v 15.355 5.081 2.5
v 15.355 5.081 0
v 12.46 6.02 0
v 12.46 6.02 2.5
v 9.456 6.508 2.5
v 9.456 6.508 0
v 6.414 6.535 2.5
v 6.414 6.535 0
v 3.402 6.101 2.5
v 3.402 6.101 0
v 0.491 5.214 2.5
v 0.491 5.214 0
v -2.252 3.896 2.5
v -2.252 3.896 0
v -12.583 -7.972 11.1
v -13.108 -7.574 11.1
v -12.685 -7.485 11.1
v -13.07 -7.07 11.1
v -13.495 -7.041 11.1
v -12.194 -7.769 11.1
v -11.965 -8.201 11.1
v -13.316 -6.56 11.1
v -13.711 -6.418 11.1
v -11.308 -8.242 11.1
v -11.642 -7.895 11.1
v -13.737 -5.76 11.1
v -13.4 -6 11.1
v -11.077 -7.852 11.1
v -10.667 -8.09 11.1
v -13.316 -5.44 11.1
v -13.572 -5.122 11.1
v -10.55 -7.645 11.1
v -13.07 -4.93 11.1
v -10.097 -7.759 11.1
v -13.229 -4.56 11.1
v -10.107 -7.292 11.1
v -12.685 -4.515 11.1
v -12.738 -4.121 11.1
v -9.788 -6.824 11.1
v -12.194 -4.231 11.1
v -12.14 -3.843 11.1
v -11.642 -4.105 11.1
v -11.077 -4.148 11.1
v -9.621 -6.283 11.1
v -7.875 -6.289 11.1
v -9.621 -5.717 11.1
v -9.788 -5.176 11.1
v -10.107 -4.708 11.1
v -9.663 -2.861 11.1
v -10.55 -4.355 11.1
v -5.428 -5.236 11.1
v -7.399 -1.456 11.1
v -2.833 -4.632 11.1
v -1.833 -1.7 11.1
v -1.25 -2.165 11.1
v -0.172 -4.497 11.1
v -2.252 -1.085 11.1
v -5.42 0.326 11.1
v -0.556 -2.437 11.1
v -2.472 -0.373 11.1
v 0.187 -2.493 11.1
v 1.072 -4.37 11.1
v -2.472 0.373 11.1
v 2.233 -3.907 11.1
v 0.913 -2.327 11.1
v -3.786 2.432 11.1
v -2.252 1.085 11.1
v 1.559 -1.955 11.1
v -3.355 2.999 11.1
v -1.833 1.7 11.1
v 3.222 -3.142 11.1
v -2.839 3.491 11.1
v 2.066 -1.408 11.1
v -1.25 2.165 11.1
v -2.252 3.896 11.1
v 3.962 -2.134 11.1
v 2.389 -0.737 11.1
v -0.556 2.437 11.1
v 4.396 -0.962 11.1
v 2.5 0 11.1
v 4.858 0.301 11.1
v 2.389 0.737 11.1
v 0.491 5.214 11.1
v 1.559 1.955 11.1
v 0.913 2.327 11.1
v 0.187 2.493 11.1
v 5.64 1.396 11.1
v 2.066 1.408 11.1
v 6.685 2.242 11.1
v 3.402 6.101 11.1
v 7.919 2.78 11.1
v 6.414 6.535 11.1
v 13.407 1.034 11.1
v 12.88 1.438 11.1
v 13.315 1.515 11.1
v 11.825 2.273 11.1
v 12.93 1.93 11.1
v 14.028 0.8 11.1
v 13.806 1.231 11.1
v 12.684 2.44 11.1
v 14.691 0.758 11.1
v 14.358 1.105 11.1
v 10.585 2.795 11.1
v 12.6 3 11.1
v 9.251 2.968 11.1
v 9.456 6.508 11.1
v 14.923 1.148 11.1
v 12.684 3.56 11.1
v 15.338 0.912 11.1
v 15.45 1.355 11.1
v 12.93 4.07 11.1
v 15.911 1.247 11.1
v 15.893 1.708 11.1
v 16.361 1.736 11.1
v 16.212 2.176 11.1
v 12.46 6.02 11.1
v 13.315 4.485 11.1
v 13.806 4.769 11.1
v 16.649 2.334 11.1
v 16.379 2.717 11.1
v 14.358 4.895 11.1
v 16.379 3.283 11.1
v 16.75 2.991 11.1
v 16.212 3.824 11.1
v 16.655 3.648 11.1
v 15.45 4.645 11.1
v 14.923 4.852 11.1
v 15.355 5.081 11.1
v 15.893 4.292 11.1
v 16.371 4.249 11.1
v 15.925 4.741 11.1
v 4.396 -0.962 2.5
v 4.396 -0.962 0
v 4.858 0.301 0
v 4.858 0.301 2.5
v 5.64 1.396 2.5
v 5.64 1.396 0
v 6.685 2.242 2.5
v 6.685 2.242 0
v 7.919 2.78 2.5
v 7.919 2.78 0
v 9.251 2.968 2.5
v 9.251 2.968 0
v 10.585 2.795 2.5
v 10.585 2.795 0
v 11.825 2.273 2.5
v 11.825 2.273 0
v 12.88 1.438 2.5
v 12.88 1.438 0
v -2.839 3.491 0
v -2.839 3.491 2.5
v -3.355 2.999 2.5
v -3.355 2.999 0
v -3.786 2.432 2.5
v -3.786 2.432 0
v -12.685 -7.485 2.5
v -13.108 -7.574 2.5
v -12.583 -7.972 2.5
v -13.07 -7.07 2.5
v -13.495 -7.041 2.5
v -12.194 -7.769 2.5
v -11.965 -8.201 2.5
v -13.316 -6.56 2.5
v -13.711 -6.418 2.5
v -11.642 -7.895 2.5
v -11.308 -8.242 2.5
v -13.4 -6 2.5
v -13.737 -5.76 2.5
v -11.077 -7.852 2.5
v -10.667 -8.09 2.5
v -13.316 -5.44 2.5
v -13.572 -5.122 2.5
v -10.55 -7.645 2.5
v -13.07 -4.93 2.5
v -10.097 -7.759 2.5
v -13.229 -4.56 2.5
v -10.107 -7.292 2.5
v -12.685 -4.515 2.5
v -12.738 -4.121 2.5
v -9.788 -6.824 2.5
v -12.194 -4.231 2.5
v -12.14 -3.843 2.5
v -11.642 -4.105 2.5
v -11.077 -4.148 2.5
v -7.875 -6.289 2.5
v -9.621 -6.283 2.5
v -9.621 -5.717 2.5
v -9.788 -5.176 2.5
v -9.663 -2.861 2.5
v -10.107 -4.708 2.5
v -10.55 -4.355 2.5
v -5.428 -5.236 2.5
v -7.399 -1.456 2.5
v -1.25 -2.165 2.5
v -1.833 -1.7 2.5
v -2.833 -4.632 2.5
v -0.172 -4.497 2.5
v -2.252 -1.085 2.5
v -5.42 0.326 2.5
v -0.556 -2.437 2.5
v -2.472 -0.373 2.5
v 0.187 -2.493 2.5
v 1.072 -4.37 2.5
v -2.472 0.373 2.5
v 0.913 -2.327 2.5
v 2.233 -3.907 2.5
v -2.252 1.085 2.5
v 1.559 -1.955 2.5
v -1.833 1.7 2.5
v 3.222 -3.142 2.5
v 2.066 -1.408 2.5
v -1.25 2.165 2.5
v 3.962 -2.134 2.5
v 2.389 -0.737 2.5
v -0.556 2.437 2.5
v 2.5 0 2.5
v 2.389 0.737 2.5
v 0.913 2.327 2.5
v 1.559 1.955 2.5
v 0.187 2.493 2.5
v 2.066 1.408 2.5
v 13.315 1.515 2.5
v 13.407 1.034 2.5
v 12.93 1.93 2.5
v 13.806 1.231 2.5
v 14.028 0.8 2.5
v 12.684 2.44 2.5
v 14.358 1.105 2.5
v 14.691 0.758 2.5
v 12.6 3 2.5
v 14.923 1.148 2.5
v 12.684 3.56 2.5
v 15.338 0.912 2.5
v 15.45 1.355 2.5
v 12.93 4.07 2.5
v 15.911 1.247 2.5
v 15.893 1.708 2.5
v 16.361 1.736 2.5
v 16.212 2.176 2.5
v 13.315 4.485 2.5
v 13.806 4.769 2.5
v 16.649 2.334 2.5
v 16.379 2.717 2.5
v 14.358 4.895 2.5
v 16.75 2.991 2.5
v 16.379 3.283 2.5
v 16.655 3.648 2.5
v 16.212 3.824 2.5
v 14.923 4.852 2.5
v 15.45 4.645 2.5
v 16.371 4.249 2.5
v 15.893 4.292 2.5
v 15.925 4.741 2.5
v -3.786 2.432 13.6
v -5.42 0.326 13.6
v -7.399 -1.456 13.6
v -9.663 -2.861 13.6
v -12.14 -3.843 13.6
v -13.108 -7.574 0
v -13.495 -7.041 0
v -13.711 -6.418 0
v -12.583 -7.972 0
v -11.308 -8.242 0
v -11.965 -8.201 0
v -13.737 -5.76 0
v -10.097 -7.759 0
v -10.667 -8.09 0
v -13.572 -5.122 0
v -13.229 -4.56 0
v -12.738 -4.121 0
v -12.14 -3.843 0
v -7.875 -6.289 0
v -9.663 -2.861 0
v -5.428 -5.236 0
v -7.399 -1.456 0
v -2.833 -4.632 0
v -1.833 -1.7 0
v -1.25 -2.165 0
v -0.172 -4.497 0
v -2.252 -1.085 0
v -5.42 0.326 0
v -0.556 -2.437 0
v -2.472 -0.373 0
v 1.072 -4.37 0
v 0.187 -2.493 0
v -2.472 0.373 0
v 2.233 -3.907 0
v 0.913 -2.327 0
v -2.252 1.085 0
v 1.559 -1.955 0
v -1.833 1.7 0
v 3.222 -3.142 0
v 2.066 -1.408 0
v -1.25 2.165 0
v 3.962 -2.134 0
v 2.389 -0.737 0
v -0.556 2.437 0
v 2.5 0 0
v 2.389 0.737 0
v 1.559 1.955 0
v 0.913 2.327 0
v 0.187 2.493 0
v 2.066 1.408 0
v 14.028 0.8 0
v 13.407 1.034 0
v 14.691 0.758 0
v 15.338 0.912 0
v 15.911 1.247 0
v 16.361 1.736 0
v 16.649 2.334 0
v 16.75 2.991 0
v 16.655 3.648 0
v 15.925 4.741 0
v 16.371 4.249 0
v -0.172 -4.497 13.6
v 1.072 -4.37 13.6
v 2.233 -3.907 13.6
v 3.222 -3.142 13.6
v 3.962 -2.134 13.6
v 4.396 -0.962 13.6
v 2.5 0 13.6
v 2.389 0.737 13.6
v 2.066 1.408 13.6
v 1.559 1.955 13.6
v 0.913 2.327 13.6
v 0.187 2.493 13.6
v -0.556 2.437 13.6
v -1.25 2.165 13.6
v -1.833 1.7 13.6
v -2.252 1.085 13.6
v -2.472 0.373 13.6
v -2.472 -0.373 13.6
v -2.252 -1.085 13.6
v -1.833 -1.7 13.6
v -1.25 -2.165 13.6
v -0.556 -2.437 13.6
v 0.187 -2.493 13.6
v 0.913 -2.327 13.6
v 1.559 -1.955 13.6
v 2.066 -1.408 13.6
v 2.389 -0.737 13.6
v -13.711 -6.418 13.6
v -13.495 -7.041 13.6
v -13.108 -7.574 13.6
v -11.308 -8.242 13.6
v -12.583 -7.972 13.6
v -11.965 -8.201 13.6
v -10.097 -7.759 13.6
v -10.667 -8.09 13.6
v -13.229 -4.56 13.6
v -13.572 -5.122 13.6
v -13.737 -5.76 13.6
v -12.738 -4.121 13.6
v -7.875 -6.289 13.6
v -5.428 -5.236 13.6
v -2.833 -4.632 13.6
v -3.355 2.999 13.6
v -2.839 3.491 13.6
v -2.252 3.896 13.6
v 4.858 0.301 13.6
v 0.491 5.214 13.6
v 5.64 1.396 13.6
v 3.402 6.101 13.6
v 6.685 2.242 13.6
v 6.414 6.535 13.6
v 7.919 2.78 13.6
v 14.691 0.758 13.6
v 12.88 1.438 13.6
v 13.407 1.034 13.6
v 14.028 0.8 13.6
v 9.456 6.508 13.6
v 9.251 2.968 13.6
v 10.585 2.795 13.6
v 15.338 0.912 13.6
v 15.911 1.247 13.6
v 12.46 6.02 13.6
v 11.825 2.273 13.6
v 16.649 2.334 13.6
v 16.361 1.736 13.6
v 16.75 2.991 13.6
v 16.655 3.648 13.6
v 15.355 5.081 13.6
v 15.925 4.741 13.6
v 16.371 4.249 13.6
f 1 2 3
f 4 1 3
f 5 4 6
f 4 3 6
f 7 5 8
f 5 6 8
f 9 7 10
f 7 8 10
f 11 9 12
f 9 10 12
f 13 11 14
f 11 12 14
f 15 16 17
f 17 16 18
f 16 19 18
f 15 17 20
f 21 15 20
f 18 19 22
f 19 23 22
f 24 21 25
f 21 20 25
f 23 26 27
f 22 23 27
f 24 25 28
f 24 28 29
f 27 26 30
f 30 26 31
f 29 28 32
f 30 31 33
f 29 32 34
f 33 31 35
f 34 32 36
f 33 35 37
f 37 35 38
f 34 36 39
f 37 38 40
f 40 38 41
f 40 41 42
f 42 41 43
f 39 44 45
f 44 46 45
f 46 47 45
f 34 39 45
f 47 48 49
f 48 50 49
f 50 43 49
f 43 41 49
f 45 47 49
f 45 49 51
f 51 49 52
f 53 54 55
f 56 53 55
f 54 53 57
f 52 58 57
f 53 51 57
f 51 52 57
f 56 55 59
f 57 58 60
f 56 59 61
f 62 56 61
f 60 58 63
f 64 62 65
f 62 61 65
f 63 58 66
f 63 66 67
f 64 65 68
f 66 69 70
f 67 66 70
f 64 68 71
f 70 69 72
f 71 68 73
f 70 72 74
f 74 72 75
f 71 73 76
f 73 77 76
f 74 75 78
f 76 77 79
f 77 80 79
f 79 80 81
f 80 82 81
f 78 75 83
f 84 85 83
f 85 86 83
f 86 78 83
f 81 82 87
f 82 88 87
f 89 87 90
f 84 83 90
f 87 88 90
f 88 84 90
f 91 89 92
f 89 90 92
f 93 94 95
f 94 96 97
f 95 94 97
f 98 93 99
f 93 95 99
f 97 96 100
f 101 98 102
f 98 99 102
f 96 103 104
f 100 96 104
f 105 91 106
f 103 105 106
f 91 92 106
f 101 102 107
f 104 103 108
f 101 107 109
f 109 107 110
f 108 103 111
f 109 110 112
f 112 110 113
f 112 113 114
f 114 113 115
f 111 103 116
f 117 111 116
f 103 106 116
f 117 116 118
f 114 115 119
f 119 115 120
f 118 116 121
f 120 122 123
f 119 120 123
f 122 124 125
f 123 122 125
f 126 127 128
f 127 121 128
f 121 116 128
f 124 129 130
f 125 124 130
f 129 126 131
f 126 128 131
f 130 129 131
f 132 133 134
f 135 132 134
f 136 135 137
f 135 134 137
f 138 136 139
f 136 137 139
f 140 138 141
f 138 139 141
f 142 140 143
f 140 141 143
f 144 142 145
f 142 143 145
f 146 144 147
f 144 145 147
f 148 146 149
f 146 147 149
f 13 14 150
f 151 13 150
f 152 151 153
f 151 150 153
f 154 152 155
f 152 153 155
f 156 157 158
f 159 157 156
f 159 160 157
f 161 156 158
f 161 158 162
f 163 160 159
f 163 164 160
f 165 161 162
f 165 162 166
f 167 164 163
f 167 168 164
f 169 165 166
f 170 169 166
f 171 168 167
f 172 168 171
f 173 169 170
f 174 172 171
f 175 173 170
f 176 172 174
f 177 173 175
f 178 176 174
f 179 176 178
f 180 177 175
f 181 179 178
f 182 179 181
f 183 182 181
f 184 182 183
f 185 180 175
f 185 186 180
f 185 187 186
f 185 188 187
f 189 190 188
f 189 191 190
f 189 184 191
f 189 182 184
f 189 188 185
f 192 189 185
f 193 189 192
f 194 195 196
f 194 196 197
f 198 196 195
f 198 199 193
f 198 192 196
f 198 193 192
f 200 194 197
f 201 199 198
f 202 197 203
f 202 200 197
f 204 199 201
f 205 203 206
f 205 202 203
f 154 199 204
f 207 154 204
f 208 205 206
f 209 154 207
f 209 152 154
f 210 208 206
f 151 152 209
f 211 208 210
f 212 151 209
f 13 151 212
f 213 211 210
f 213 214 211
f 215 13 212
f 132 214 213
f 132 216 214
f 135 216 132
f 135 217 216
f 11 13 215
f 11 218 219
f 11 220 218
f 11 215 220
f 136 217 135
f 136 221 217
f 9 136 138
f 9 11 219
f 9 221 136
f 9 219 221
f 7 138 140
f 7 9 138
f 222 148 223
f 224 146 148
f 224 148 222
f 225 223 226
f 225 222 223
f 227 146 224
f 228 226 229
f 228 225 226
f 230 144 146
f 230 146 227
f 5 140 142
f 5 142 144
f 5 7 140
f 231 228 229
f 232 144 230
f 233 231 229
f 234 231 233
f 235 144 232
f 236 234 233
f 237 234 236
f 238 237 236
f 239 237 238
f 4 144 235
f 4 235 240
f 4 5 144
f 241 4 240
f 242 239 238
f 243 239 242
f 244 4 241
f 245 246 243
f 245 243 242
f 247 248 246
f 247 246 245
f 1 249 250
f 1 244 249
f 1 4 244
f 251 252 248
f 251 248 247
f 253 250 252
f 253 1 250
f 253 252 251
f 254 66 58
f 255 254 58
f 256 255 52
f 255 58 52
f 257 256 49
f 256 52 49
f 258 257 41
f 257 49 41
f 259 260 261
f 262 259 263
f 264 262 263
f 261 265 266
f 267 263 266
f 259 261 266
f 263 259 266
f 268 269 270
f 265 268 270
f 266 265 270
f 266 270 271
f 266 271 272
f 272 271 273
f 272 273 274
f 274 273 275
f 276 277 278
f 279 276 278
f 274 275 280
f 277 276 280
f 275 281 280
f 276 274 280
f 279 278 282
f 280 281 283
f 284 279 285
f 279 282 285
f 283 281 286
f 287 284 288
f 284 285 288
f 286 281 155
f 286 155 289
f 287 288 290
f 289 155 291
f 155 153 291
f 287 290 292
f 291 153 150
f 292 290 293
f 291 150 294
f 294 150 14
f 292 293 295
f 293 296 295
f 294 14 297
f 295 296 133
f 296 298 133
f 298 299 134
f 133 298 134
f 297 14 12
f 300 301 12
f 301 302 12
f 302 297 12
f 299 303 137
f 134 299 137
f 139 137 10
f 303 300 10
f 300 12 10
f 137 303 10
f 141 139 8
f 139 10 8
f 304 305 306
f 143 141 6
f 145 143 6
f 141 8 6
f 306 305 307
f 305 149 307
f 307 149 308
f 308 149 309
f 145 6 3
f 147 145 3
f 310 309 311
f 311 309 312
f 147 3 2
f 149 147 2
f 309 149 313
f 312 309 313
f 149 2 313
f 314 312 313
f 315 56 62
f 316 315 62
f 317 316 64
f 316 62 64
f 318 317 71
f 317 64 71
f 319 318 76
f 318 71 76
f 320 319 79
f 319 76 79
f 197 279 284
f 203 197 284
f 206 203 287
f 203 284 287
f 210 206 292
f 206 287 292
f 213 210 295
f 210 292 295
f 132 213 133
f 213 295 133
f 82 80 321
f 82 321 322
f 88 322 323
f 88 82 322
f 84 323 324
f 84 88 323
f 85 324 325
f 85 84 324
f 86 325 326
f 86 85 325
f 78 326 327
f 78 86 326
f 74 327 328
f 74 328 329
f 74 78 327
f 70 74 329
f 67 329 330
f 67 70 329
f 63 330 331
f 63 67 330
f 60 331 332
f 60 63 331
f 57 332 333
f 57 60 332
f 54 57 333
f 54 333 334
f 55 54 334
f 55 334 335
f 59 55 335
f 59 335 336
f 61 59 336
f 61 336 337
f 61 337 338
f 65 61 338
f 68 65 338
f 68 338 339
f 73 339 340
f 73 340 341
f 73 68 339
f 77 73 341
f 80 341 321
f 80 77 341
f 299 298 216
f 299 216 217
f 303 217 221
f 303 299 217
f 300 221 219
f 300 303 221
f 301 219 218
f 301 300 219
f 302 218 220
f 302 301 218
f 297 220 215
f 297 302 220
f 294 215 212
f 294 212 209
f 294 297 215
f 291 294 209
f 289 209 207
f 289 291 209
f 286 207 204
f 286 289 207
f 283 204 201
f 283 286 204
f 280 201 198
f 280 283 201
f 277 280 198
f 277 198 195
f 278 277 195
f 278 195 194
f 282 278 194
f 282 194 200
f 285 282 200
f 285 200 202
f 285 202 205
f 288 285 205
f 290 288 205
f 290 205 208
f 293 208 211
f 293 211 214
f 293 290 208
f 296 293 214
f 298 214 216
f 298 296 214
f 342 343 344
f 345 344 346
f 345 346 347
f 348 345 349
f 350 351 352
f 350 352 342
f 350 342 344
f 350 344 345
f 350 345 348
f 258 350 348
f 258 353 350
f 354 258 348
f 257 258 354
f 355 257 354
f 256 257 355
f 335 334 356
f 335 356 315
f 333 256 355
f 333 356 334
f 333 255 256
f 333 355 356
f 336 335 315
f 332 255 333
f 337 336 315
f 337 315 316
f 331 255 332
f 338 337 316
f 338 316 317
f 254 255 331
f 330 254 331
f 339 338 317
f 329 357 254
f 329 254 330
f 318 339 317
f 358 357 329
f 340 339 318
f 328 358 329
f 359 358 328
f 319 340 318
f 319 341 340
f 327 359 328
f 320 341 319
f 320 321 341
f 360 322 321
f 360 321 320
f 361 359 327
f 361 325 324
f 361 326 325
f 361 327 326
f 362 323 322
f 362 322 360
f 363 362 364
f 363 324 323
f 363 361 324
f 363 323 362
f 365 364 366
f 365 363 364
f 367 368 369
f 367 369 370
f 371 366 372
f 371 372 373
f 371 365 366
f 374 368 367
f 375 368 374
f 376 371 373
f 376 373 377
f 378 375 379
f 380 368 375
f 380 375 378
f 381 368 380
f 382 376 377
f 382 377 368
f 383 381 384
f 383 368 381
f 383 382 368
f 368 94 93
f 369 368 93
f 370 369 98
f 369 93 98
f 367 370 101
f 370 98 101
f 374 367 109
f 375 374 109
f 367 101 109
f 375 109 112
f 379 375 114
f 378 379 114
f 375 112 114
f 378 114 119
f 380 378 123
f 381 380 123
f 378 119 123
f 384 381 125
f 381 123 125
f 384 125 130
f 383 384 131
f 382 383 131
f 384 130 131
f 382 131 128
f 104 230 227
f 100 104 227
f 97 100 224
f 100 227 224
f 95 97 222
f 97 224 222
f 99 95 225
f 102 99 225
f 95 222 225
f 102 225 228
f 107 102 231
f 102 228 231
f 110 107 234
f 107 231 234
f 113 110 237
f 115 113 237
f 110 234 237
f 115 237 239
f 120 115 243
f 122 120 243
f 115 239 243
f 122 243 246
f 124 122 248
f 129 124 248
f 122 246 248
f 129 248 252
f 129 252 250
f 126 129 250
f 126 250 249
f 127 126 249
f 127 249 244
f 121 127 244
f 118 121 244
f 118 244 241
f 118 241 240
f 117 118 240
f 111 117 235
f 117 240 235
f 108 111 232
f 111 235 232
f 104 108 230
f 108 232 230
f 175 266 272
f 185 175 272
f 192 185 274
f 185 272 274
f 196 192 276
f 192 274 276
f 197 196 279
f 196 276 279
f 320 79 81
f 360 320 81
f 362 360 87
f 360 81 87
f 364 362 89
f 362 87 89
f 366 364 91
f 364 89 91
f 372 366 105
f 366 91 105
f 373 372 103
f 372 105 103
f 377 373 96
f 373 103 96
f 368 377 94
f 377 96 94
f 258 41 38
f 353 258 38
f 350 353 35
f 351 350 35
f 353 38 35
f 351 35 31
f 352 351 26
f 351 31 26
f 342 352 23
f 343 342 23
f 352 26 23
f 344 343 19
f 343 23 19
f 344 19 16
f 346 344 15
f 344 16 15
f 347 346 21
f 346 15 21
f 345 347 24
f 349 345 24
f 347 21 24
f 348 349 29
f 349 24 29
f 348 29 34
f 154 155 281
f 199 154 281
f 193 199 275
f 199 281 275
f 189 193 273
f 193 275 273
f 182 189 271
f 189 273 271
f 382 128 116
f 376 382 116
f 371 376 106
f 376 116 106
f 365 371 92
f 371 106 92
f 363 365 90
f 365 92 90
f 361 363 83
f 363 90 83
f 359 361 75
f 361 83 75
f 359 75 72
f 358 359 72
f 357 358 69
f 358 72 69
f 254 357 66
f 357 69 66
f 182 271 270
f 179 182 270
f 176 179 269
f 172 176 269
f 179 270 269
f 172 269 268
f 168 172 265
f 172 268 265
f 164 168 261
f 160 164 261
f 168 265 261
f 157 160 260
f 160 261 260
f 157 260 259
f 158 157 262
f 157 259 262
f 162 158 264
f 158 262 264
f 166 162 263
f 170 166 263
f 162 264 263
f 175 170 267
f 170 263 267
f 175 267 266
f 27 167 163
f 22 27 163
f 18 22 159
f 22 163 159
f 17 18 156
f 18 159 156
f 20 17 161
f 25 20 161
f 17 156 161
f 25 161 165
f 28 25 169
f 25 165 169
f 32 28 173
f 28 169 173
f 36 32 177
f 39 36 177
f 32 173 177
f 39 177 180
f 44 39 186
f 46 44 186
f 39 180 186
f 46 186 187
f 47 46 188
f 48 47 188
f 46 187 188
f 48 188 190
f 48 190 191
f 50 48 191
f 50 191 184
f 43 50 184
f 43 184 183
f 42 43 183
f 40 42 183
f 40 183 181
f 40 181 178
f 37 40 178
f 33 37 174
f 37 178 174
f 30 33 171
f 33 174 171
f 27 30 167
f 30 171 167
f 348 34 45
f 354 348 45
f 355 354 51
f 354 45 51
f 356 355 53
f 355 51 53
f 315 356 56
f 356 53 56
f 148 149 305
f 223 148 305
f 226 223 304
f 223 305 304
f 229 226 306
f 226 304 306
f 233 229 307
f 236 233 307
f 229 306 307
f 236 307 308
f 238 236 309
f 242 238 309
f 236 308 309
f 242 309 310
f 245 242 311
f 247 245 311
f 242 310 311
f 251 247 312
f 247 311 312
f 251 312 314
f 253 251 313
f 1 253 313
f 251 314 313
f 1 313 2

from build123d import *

# Parameters (mm, degrees)
CROQUIS1_R              = 2.5
SALIENTE_EXTRUIR1_DEPTH = 2.5
CROQUIS2_R              = 1.9
SALIENTE_EXTRUIR2_DEPTH = 8.6
CROQUIS3_R              = 2.5
SALIENTE_EXTRUIR3_DEPTH = 2.5


with BuildPart() as part:
    # Croquis1 → Saliente-Extruir1 (new body)
    with BuildSketch(Plane.XY):
        with BuildLine():
            ThreePointArc((-0.171650138, -4.496725056), (2.753921849, -3.558920405), (4.395901196, -0.962316307))
            ThreePointArc((4.395901196, -0.962316307), (7.9188241, 2.779530342), (12.880073197, 1.43848242))
            ThreePointArc((12.880073197, 1.43848242), (16.361169276, 1.735662654), (15.354744139, 5.081324688))
            ThreePointArc((15.354744139, 5.081324688), (6.413547413, 6.535486918), (-2.252037616, 3.895937188))
            ThreePointArc((-2.252037616, 3.895937188), (-3.106745208, 3.25547757), (-3.786445073, 2.431631903))
            ThreePointArc((-3.786445073, 2.431631903), (-7.399355323, -1.45649364), (-12.140164606, -3.842990664))
            ThreePointArc((-12.140164606, -3.842990664), (-13.494815904, -7.040773515), (-10.097019643, -7.75901851))
            ThreePointArc((-10.097019643, -7.75901851), (-5.427542776, -5.235801021), (-0.171650138, -4.496725056))
        make_face()
        Circle(CROQUIS1_R, mode=Mode.SUBTRACT)
    extrude(amount=SALIENTE_EXTRUIR1_DEPTH)

    # Croquis2 → Saliente-Extruir2 (add)
    with BuildSketch(Plane.XY.offset(2.5)):
        with Locations(Location((-11.5, -6, 0), (0, 0, 180))):
            Circle(CROQUIS2_R)
        with Locations(Location((14.5, 3, 0), (0, 0, 180))):
            Circle(CROQUIS2_R)
    extrude(amount=SALIENTE_EXTRUIR2_DEPTH)

    # Croquis3 → Saliente-Extruir3 (add)
    with BuildSketch(Plane.XY.offset(11.1)):
        with BuildLine():
            ThreePointArc((12.880073197, 1.43848242), (16.361169276, 1.735662654), (15.354744139, 5.081324688))
            ThreePointArc((15.354744139, 5.081324688), (6.413547413, 6.535486918), (-2.252037616, 3.895937188))
            ThreePointArc((-2.252037616, 3.895937188), (-3.106745208, 3.25547757), (-3.786445073, 2.431631903))
            ThreePointArc((-3.786445073, 2.431631903), (-7.399355323, -1.45649364), (-12.140164606, -3.842990664))
            ThreePointArc((-12.140164606, -3.842990664), (-13.494815904, -7.040773515), (-10.097019643, -7.75901851))
            ThreePointArc((-10.097019643, -7.75901851), (-5.427542776, -5.235801021), (-0.171650138, -4.496725056))
            ThreePointArc((-0.171650138, -4.496725056), (2.753921849, -3.558920405), (4.395901196, -0.962316307))
            ThreePointArc((4.395901196, -0.962316307), (7.9188241, 2.779530342), (12.880073197, 1.43848242))
        make_face()
        Circle(CROQUIS3_R, mode=Mode.SUBTRACT)
    extrude(amount=SALIENTE_EXTRUIR3_DEPTH)


solid = part.part
